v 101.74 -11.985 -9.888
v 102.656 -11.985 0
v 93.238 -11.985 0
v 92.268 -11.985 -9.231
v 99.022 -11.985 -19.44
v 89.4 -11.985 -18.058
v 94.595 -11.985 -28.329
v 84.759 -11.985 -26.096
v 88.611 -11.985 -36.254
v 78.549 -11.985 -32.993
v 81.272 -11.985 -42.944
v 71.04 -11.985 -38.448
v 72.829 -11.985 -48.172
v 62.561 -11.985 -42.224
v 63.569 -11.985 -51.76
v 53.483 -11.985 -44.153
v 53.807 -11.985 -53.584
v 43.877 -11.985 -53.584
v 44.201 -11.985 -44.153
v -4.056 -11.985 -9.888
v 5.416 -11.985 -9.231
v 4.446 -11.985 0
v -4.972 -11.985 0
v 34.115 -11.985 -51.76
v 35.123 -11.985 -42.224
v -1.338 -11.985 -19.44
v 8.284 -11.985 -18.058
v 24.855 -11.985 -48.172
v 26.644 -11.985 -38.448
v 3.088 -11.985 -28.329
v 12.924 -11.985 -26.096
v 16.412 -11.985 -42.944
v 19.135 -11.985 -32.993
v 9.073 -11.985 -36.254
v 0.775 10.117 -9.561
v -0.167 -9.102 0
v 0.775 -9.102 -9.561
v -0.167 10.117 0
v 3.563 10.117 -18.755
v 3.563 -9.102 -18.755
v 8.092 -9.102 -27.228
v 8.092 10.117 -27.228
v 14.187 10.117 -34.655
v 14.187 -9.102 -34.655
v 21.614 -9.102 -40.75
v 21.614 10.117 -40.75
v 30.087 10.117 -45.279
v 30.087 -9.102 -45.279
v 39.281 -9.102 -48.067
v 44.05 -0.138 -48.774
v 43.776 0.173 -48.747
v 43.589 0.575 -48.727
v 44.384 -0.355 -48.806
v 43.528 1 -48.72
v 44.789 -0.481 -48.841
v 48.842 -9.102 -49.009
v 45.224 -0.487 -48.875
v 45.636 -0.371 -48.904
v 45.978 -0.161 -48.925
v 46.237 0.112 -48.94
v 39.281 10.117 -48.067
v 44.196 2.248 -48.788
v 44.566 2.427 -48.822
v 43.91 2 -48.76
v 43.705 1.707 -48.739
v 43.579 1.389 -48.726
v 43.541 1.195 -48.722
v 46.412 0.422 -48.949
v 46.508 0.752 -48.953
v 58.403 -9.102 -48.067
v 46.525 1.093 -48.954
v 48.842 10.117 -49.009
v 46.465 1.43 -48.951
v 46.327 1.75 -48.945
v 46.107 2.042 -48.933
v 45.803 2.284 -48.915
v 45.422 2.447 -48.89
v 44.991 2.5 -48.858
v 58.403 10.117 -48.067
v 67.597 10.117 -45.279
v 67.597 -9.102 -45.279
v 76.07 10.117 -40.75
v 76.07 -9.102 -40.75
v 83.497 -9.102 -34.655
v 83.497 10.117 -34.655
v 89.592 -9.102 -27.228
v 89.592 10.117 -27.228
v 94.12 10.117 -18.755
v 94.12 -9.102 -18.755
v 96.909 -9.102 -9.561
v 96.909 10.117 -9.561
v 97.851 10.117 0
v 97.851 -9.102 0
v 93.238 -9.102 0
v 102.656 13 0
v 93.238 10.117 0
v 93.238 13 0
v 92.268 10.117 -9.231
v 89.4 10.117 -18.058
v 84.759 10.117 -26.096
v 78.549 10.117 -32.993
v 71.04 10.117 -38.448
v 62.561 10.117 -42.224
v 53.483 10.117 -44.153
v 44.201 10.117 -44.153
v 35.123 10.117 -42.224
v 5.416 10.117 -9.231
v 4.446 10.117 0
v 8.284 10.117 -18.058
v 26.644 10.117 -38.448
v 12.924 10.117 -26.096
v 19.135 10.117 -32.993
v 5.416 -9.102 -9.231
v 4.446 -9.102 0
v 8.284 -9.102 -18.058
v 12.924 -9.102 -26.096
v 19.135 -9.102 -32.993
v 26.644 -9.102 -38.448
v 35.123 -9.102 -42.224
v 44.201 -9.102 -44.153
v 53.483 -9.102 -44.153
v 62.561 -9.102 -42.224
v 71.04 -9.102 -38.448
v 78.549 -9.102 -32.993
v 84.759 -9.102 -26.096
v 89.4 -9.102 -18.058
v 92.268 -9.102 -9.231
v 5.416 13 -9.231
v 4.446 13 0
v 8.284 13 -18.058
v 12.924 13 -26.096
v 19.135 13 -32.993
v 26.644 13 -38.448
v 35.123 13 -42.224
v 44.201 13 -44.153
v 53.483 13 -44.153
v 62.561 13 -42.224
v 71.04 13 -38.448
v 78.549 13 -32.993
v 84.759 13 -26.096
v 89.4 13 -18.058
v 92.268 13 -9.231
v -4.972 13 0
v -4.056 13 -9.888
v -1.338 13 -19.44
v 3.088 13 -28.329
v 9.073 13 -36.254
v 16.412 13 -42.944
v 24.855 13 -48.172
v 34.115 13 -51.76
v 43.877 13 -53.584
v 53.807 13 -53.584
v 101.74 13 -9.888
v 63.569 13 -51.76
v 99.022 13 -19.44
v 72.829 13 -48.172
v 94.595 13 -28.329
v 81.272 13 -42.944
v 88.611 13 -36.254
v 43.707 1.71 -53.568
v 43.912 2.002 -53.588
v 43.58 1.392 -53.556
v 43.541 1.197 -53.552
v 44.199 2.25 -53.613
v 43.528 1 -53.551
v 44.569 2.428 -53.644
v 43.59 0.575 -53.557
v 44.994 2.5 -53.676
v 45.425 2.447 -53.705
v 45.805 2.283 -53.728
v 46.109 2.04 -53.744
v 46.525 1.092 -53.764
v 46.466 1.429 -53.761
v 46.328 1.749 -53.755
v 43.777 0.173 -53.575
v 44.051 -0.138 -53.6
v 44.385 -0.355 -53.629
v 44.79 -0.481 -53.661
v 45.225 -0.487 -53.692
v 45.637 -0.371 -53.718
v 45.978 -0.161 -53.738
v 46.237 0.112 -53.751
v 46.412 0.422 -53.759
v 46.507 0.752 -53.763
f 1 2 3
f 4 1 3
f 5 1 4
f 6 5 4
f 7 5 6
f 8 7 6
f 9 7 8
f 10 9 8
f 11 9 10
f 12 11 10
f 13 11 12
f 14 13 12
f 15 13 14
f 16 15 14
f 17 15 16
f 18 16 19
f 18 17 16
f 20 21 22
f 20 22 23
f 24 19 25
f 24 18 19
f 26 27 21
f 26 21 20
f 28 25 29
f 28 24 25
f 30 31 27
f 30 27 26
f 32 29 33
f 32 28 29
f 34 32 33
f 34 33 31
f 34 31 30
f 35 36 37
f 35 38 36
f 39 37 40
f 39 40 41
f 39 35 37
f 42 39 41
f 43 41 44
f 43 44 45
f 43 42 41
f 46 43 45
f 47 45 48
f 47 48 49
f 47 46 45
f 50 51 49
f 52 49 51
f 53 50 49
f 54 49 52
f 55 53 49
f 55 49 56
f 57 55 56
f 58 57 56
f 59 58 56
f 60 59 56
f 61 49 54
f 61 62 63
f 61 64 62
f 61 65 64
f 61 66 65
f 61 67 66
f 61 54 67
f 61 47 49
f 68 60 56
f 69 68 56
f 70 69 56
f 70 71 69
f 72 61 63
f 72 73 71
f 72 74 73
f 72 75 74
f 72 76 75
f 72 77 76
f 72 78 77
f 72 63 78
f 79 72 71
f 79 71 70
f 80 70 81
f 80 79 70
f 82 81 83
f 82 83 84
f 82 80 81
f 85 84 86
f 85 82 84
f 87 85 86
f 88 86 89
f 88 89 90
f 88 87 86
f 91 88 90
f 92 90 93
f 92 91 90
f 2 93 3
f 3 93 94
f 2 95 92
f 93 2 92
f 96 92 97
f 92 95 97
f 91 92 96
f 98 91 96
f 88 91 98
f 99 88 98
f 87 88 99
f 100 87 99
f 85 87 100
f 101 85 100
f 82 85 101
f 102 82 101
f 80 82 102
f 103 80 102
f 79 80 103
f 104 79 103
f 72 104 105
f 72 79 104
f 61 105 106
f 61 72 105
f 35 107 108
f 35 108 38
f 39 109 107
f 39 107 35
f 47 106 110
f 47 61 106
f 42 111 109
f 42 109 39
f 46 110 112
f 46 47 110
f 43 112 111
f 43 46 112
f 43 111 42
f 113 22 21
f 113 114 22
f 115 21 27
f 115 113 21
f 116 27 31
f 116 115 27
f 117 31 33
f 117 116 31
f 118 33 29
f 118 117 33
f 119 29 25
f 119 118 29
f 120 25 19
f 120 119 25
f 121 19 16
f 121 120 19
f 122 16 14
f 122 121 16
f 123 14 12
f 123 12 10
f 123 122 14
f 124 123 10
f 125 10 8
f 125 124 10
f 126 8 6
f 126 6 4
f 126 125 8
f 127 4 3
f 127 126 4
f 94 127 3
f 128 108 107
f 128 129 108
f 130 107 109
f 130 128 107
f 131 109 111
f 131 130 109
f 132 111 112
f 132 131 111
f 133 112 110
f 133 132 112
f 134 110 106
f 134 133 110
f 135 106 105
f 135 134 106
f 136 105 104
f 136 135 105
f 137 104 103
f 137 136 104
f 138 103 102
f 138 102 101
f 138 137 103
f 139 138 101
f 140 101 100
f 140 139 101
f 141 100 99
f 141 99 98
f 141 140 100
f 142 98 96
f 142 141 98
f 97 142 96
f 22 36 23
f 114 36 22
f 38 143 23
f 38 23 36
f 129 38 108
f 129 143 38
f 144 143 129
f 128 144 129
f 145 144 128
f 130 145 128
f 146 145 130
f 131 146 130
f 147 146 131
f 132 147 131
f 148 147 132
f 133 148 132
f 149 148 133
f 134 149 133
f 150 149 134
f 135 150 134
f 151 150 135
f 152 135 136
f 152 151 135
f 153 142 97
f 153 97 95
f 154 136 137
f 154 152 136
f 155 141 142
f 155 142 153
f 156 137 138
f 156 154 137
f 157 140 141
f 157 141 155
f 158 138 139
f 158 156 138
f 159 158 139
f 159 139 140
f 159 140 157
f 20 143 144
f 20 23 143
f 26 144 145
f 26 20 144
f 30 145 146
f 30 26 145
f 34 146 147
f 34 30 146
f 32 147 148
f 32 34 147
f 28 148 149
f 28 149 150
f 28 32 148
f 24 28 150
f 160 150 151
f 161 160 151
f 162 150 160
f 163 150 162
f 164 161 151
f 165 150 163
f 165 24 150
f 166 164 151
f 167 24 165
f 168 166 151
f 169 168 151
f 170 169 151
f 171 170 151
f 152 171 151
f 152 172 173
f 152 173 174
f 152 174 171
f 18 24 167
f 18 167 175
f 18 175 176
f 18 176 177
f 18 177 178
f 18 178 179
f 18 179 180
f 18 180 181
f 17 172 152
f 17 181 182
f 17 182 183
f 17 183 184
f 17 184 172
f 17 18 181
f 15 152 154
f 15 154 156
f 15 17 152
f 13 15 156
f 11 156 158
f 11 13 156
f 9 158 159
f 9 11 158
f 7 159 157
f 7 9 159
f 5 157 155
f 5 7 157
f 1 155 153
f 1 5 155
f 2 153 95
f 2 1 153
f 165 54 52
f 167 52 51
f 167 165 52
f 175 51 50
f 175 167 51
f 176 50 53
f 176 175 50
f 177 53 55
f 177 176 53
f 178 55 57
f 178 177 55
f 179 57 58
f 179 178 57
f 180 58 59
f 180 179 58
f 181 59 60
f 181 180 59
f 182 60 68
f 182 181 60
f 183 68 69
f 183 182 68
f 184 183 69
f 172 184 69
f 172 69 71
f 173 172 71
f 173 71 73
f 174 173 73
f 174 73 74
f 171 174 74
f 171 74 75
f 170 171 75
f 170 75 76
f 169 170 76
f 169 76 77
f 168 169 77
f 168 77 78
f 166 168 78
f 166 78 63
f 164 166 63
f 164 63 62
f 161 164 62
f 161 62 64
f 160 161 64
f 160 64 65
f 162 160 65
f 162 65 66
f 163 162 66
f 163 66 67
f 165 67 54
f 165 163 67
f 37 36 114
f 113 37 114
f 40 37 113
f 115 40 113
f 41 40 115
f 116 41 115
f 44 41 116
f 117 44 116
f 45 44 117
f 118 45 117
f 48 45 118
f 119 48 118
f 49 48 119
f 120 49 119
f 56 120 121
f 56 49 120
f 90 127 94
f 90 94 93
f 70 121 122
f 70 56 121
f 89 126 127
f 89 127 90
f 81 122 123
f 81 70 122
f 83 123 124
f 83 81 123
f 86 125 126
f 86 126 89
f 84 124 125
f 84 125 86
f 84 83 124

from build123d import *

# Parameters (mm, degrees)
REVOLVE1_ANGLE     = 180
SKETCH2_R          = 1.5
CUT_EXTRUDE1_DEPTH = 21


with BuildPart() as part:
    # Sketch1 → Revolve1 (revolve)
    with BuildSketch(Plane.XY):
        Polygon((-4.971917279, -11.985029192), (4.445516801, -11.985029192), (4.445516801, -9.102141208), (-0.167103973, -9.102141208), (-0.167103973, 10.117112016), (4.445516801, 10.117112016), (4.445516801, 13), (-4.971917279, 13), align=None)
    revolve(axis=Axis((48.841991749, -11.985029192, 0), (0, -1, 0)), revolution_arc=REVOLVE1_ANGLE)

    # Sketch2 → Cut-Extrude1 (cut)
    with BuildSketch(Plane.XY.offset(-54)):
        with Locations(Location((45.028082721, 1, 0), (0, 0, 180))):
            Circle(SKETCH2_R)
    extrude(amount=CUT_EXTRUDE1_DEPTH, mode=Mode.SUBTRACT)


solid = part.part
